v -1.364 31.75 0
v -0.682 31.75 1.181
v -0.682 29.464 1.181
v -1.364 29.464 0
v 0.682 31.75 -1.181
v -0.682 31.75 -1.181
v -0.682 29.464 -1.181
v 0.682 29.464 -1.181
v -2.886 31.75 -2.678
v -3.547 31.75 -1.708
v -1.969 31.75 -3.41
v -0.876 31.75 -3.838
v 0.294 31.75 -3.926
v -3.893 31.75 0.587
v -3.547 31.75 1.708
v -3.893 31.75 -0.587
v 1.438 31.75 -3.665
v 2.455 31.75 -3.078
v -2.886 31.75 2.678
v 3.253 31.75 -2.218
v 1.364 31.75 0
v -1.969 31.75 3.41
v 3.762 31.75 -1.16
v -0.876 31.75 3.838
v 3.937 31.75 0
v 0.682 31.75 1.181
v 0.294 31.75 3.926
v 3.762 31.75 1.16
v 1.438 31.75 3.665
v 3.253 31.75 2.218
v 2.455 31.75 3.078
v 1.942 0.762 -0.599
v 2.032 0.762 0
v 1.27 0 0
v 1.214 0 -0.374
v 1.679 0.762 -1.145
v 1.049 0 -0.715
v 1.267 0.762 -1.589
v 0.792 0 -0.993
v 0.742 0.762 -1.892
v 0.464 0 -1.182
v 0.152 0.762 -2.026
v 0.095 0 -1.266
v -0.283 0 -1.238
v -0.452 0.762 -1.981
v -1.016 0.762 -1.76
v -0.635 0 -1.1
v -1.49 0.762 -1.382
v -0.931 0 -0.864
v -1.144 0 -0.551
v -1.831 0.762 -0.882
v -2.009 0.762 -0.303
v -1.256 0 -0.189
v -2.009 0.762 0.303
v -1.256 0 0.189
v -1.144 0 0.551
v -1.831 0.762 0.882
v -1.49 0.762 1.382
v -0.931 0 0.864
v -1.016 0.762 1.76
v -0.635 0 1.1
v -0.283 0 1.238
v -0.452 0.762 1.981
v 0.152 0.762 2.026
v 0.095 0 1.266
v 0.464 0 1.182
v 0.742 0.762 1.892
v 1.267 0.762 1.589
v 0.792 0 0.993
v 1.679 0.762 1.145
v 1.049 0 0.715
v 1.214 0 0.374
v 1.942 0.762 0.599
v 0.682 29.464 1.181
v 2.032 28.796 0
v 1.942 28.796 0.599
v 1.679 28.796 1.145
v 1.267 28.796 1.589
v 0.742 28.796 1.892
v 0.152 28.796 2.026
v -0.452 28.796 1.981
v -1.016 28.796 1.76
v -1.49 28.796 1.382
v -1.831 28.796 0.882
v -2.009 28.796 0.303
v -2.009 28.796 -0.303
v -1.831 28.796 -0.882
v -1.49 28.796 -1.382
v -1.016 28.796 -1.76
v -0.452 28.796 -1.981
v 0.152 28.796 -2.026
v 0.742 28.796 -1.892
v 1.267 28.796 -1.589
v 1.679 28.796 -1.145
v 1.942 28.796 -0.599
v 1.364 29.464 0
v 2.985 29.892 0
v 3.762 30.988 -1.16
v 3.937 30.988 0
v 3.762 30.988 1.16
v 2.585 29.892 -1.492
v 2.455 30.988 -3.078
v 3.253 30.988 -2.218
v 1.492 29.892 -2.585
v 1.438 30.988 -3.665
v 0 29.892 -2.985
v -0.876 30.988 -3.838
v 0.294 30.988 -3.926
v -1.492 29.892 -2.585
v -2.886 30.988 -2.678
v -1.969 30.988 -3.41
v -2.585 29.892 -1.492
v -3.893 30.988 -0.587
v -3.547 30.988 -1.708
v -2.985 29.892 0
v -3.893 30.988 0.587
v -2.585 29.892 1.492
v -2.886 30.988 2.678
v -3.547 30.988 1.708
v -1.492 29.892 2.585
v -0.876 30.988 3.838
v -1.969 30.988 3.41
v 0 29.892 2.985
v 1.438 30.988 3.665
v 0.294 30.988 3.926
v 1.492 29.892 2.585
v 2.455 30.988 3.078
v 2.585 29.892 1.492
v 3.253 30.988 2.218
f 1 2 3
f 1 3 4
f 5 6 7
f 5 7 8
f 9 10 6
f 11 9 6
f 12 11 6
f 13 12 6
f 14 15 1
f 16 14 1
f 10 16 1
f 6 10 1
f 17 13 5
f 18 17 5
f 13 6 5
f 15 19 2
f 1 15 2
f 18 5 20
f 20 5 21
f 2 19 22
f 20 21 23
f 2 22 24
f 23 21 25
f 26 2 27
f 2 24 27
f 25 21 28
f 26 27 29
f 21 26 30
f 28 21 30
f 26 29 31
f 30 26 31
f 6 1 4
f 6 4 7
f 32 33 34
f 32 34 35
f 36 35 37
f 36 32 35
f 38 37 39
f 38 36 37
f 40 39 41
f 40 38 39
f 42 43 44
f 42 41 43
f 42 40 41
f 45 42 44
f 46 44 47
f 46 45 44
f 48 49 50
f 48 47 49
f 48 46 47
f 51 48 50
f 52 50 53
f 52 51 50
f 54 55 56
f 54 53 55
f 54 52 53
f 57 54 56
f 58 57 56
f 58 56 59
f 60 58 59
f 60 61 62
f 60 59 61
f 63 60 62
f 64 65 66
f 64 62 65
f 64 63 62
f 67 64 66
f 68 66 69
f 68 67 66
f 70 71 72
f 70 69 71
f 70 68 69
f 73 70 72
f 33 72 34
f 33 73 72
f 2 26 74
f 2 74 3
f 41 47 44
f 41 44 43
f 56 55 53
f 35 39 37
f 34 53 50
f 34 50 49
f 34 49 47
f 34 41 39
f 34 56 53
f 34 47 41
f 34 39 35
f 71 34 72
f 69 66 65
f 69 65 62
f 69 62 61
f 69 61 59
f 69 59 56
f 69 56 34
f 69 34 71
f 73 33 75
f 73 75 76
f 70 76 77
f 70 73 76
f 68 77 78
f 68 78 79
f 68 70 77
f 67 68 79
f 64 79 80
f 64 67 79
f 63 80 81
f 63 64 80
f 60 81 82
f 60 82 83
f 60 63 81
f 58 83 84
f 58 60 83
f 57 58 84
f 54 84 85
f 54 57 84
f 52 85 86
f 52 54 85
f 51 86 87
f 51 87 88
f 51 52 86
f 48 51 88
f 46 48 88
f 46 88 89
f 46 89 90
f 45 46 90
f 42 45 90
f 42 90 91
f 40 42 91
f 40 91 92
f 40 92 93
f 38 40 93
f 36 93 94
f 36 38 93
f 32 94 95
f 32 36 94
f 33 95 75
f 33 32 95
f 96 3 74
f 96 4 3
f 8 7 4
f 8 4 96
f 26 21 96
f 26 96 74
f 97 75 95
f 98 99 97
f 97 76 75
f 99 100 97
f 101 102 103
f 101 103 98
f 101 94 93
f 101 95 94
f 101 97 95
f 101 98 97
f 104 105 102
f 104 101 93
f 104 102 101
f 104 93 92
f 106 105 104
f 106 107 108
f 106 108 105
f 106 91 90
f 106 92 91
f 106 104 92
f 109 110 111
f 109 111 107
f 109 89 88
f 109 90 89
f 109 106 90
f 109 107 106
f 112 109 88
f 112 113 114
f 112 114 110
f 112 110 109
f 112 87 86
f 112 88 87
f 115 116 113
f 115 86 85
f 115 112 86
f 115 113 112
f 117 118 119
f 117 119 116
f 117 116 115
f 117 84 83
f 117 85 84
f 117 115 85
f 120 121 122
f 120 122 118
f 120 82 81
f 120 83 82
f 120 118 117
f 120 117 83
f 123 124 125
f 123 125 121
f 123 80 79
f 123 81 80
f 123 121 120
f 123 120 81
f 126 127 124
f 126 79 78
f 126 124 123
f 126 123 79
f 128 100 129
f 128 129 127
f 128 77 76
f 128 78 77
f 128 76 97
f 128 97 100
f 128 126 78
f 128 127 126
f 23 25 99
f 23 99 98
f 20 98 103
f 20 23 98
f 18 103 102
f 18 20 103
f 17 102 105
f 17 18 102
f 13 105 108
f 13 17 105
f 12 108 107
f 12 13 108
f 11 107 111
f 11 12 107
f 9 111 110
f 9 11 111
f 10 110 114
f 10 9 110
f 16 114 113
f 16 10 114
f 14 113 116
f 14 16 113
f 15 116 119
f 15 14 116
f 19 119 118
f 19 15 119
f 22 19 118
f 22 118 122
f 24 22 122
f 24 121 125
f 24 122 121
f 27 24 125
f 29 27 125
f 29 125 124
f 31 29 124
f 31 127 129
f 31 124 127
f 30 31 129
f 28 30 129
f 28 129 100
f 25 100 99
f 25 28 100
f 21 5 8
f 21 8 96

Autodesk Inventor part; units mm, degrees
ref_plane "YZ Plane" through (0, 0, 0) normal (1, 0, 0) x (0, 1, 0)
ref_plane "XZ Plane" through (0, 0, 0) normal (0, 1, 0) x (-1, 0, 0)
ref_plane "XY Plane" through (0, 0, 0) normal (0, 0, 1) x (1, 0, 0)
sketch "Sketch1" plane through (0, 0, 0) normal (0, 0, 1) x (1, 0, 0)
  line L0 (0, 0) -> (3.937, 0)
  line L1 (3.937, 0) -> (3.937, 31.75)
  line L2 (3.937, 31.75) -> (0, 31.75)
  line L3 (0, 31.75) -> (0, 0)
  line L4 (2.032, 28.7965) -> (2.032, 0)
  line L5 (2.032, 28.7965) -> (3.937, 30.988)
  dimension "d0" = 3.937
  dimension "d1" = 31.75
  dimension "d2" = 2.032
  dimension "d3" = 0.762
  dimension "d4" = 41
revolve "Revolution1" add sketch "Sketch1" angle 360 about axis through (0, 31.75, 0) along (0, -1, 0) contours L3 L2 L1 L5 L4 L0
chamfer "Chamfer1" distance 0.762 angle 45 1 edges at (-2.032, 0, 0)
thread "Thread1" size "8-32 UNC" class "2A" standard "ANSI Unified Screw Threads" full length
sketch "Sketch2" plane through (0, 31.75, 0) normal (0, 1, 0) x (1, 0, 0)
  line L0 (1.3638, 0) -> (0.6819, -1.1811)
  line L1 (0.6819, -1.1811) -> (-0.6819, -1.1811)
  line L2 (-0.6819, -1.1811) -> (-1.3638, 0)
  line L3 (-1.3638, 0) -> (-0.6819, 1.1811)
  line L4 (-0.6819, 1.1811) -> (0.6819, 1.1811)
  line L5 (0.6819, 1.1811) -> (1.3638, 0)
  point P0 (0, 0)
  point P1 (0, 0)
  point P2 (0, 0)
  dimension "d11" = 2.3622
extrude "Extrusion1" cut sketch "Sketch2" against normal blind 2.286
properties part number "8-32 UNC Flathead Bolt" material "Stainless Steel"
